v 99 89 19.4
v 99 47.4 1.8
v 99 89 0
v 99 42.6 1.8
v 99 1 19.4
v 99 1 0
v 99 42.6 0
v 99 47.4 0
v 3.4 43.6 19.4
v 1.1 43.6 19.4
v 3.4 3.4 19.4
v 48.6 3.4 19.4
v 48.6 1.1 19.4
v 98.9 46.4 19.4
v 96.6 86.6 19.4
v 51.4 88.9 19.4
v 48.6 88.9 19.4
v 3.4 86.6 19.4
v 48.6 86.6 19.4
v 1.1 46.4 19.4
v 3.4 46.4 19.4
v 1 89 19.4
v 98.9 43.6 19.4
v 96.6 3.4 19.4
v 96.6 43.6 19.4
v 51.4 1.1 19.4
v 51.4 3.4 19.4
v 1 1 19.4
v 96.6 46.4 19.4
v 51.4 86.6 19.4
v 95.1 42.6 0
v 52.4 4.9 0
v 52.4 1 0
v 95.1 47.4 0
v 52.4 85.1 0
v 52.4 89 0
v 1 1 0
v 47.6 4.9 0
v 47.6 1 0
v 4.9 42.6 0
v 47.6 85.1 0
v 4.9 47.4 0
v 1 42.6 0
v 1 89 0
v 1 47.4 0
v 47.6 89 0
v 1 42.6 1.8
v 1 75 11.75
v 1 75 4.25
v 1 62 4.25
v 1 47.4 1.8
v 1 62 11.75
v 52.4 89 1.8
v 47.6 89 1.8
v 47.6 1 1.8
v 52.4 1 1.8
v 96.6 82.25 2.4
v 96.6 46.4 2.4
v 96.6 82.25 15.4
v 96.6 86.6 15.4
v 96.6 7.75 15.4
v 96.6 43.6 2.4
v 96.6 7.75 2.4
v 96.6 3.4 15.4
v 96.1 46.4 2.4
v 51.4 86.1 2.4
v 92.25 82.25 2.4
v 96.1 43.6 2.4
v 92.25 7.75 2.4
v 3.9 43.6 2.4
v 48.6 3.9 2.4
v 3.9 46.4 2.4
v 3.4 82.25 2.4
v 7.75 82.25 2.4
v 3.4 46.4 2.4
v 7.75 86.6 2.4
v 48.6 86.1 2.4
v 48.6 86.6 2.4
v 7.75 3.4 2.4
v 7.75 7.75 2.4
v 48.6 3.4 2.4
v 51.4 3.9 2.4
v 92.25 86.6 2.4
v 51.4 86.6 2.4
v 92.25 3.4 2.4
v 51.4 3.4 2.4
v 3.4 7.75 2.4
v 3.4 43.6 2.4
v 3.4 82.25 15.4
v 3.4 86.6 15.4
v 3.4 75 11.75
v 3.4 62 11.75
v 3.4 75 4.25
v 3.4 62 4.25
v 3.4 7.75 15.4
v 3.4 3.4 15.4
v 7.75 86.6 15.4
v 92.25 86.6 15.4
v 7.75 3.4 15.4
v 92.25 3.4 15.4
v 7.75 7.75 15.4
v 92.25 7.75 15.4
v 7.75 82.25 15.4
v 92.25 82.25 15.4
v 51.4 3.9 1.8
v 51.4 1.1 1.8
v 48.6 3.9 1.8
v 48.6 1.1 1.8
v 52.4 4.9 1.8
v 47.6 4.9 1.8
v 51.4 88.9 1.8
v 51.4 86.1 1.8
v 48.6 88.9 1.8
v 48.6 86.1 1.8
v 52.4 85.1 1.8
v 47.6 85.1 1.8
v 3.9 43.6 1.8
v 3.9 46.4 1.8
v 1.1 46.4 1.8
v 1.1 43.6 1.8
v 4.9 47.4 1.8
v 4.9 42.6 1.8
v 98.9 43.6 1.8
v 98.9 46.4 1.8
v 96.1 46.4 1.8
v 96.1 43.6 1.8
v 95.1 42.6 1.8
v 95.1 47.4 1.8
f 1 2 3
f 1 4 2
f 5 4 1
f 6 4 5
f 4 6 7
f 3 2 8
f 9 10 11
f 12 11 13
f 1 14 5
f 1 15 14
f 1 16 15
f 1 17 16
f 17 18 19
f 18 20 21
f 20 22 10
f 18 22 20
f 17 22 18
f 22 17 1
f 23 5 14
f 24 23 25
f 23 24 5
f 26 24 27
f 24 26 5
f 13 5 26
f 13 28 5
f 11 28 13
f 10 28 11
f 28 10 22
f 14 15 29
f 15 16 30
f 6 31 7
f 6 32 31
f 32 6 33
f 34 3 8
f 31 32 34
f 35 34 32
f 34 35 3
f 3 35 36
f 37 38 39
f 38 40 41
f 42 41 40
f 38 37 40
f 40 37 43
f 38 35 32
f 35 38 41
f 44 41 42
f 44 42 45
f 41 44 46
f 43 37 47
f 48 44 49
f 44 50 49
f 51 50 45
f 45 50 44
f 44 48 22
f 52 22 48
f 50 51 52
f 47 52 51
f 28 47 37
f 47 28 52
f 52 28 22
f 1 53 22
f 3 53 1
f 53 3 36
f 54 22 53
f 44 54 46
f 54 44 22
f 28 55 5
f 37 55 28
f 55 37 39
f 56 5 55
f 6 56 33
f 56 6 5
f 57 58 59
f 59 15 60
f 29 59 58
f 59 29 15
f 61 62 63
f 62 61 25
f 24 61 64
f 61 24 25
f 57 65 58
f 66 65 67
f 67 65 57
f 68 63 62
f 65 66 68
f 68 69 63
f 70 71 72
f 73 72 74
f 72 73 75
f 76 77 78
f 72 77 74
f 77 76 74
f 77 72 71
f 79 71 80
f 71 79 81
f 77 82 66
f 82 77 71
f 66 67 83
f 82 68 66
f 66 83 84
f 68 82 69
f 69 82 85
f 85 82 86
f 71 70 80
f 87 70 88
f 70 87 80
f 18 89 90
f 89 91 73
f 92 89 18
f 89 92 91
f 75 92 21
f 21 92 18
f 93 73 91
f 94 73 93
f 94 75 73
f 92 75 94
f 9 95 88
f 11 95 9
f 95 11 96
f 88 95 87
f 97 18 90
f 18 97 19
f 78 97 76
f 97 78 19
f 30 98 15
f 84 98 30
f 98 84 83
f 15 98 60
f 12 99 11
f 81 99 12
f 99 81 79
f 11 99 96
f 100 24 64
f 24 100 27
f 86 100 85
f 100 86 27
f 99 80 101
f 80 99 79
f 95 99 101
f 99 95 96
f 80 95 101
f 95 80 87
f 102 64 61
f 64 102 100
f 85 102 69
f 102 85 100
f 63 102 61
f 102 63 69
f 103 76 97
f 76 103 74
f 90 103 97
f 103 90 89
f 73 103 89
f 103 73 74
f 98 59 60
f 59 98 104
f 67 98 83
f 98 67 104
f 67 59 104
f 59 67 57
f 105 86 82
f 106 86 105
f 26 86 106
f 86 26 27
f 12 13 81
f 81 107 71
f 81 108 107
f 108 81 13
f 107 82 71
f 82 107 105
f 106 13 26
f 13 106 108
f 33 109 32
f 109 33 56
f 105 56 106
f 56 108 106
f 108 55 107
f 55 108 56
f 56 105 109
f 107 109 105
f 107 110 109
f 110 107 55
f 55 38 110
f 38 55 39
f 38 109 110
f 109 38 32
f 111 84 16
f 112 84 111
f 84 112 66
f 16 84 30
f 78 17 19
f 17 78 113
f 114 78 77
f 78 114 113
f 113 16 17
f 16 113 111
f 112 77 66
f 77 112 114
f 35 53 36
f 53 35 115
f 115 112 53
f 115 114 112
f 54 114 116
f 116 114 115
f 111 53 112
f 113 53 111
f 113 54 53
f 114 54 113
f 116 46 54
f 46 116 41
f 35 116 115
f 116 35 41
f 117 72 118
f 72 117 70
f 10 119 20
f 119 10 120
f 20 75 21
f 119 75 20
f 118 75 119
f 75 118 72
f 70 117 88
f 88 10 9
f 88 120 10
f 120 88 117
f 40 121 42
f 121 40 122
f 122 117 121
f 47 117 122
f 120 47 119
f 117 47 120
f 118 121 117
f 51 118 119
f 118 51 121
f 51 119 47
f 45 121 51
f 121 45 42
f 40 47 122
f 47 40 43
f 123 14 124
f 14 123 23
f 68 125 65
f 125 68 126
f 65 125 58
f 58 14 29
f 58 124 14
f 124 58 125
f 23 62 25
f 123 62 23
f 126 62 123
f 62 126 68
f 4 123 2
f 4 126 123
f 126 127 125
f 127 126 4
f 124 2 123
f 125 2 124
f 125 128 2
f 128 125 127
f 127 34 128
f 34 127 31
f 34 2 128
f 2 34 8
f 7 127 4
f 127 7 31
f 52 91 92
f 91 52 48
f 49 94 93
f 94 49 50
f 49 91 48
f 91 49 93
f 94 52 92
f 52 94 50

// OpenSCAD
part = "base";

case_x = 100;
case_y = 90;
base_x = 98;
base_y = 88;
base_h = 19.4;
base_wall = 2.4;
base_floor = 2.4;
front_h = 15.4;
face_t = 2.4;
main_wall = 2.4;
fit_clearance = 0.25;

board_x = 92;
board_y = 82;
board_offset_x = (case_x - board_x) / 2;
board_offset_y = (case_y - board_y) / 2;

screws = [[50, 2.5], [50, 87.5], [2.5, 45], [97.5, 45]];
lcd_center = [board_offset_x + 25.86, board_offset_y + 20];
camera_center = [board_offset_x + 70.75, board_offset_y + 19.75];
button_centers = [[board_offset_x + 16, board_offset_y + 44], [board_offset_x + 34, board_offset_y + 44]];
usb_center = [board_offset_x + 20.5, board_offset_y + 64.5];

module case_base() {
    difference() {
        union() {
            difference() {
                translate([(case_x - base_x) / 2, (case_y - base_y) / 2, 0])
                    cube([base_x, base_y, base_h]);
                translate([board_offset_x - 0.6, board_offset_y - 0.6, base_floor])
                    cube([board_x + 1.2, board_y + 1.2, base_h]);
            }
            for (p = [[5.5, 5.5], [94.5, 5.5], [5.5, 84.5], [94.5, 84.5]])
                translate([p[0] - 2.25, p[1] - 2.25, base_floor - 0.2])
                    cube([4.5, 4.5, 13.2]);
        }
        translate([-2, usb_center[1] - 6.5, 8 - 3.75])
            cube([6, 13, 7.5]);
        for (p = screws) {
            translate([p[0] - 1.4, p[1] - 1.4, -0.5]) cube([2.8, 2.8, base_h + 1]);
            translate([p[0] - 2.4, p[1] - 2.4, -0.1]) cube([4.8, 4.8, 1.9]);
        }
    }
}

module case_front() {
    difference() {
        union() {
            difference() {
                cube([case_x, case_y, front_h]);
                translate([main_wall, main_wall, face_t])
                    cube([case_x - 2 * main_wall, case_y - 2 * main_wall, front_h - face_t - 2.4]);
                translate([(case_x - (base_x + 2 * fit_clearance)) / 2,
                           (case_y - (base_y + 2 * fit_clearance)) / 2, front_h - 2.4])
                    cube([base_x + 2 * fit_clearance, base_y + 2 * fit_clearance, 3]);
            }
            for (p = screws)
                translate([p[0] - 2.4, p[1] - 2.4, face_t])
                    cube([4.8, 4.8, front_h - face_t]);
        }
        translate([lcd_center[0] - 14.2, lcd_center[1] - 14.2, -0.5])
            cube([28.4, 28.4, face_t + 1]);
        translate([camera_center[0] - 7.5, camera_center[1] - 7.5, -0.5])
            cube([15, 15, face_t + 1]);
        for (p = button_centers)
            translate([p[0] - 3.4, p[1] - 3.4, -0.5]) cube([6.8, 6.8, face_t + 1]);
        for (p = screws)
            translate([p[0] - 1.05, p[1] - 1.05, front_h - 10]) cube([2.1, 2.1, 10.5]);
    }
}

if (part == "base") case_base();
if (part == "front") case_front();
if (part == "both") {
    case_base();
    translate([case_x + 10, 0, 0]) case_front();
}
